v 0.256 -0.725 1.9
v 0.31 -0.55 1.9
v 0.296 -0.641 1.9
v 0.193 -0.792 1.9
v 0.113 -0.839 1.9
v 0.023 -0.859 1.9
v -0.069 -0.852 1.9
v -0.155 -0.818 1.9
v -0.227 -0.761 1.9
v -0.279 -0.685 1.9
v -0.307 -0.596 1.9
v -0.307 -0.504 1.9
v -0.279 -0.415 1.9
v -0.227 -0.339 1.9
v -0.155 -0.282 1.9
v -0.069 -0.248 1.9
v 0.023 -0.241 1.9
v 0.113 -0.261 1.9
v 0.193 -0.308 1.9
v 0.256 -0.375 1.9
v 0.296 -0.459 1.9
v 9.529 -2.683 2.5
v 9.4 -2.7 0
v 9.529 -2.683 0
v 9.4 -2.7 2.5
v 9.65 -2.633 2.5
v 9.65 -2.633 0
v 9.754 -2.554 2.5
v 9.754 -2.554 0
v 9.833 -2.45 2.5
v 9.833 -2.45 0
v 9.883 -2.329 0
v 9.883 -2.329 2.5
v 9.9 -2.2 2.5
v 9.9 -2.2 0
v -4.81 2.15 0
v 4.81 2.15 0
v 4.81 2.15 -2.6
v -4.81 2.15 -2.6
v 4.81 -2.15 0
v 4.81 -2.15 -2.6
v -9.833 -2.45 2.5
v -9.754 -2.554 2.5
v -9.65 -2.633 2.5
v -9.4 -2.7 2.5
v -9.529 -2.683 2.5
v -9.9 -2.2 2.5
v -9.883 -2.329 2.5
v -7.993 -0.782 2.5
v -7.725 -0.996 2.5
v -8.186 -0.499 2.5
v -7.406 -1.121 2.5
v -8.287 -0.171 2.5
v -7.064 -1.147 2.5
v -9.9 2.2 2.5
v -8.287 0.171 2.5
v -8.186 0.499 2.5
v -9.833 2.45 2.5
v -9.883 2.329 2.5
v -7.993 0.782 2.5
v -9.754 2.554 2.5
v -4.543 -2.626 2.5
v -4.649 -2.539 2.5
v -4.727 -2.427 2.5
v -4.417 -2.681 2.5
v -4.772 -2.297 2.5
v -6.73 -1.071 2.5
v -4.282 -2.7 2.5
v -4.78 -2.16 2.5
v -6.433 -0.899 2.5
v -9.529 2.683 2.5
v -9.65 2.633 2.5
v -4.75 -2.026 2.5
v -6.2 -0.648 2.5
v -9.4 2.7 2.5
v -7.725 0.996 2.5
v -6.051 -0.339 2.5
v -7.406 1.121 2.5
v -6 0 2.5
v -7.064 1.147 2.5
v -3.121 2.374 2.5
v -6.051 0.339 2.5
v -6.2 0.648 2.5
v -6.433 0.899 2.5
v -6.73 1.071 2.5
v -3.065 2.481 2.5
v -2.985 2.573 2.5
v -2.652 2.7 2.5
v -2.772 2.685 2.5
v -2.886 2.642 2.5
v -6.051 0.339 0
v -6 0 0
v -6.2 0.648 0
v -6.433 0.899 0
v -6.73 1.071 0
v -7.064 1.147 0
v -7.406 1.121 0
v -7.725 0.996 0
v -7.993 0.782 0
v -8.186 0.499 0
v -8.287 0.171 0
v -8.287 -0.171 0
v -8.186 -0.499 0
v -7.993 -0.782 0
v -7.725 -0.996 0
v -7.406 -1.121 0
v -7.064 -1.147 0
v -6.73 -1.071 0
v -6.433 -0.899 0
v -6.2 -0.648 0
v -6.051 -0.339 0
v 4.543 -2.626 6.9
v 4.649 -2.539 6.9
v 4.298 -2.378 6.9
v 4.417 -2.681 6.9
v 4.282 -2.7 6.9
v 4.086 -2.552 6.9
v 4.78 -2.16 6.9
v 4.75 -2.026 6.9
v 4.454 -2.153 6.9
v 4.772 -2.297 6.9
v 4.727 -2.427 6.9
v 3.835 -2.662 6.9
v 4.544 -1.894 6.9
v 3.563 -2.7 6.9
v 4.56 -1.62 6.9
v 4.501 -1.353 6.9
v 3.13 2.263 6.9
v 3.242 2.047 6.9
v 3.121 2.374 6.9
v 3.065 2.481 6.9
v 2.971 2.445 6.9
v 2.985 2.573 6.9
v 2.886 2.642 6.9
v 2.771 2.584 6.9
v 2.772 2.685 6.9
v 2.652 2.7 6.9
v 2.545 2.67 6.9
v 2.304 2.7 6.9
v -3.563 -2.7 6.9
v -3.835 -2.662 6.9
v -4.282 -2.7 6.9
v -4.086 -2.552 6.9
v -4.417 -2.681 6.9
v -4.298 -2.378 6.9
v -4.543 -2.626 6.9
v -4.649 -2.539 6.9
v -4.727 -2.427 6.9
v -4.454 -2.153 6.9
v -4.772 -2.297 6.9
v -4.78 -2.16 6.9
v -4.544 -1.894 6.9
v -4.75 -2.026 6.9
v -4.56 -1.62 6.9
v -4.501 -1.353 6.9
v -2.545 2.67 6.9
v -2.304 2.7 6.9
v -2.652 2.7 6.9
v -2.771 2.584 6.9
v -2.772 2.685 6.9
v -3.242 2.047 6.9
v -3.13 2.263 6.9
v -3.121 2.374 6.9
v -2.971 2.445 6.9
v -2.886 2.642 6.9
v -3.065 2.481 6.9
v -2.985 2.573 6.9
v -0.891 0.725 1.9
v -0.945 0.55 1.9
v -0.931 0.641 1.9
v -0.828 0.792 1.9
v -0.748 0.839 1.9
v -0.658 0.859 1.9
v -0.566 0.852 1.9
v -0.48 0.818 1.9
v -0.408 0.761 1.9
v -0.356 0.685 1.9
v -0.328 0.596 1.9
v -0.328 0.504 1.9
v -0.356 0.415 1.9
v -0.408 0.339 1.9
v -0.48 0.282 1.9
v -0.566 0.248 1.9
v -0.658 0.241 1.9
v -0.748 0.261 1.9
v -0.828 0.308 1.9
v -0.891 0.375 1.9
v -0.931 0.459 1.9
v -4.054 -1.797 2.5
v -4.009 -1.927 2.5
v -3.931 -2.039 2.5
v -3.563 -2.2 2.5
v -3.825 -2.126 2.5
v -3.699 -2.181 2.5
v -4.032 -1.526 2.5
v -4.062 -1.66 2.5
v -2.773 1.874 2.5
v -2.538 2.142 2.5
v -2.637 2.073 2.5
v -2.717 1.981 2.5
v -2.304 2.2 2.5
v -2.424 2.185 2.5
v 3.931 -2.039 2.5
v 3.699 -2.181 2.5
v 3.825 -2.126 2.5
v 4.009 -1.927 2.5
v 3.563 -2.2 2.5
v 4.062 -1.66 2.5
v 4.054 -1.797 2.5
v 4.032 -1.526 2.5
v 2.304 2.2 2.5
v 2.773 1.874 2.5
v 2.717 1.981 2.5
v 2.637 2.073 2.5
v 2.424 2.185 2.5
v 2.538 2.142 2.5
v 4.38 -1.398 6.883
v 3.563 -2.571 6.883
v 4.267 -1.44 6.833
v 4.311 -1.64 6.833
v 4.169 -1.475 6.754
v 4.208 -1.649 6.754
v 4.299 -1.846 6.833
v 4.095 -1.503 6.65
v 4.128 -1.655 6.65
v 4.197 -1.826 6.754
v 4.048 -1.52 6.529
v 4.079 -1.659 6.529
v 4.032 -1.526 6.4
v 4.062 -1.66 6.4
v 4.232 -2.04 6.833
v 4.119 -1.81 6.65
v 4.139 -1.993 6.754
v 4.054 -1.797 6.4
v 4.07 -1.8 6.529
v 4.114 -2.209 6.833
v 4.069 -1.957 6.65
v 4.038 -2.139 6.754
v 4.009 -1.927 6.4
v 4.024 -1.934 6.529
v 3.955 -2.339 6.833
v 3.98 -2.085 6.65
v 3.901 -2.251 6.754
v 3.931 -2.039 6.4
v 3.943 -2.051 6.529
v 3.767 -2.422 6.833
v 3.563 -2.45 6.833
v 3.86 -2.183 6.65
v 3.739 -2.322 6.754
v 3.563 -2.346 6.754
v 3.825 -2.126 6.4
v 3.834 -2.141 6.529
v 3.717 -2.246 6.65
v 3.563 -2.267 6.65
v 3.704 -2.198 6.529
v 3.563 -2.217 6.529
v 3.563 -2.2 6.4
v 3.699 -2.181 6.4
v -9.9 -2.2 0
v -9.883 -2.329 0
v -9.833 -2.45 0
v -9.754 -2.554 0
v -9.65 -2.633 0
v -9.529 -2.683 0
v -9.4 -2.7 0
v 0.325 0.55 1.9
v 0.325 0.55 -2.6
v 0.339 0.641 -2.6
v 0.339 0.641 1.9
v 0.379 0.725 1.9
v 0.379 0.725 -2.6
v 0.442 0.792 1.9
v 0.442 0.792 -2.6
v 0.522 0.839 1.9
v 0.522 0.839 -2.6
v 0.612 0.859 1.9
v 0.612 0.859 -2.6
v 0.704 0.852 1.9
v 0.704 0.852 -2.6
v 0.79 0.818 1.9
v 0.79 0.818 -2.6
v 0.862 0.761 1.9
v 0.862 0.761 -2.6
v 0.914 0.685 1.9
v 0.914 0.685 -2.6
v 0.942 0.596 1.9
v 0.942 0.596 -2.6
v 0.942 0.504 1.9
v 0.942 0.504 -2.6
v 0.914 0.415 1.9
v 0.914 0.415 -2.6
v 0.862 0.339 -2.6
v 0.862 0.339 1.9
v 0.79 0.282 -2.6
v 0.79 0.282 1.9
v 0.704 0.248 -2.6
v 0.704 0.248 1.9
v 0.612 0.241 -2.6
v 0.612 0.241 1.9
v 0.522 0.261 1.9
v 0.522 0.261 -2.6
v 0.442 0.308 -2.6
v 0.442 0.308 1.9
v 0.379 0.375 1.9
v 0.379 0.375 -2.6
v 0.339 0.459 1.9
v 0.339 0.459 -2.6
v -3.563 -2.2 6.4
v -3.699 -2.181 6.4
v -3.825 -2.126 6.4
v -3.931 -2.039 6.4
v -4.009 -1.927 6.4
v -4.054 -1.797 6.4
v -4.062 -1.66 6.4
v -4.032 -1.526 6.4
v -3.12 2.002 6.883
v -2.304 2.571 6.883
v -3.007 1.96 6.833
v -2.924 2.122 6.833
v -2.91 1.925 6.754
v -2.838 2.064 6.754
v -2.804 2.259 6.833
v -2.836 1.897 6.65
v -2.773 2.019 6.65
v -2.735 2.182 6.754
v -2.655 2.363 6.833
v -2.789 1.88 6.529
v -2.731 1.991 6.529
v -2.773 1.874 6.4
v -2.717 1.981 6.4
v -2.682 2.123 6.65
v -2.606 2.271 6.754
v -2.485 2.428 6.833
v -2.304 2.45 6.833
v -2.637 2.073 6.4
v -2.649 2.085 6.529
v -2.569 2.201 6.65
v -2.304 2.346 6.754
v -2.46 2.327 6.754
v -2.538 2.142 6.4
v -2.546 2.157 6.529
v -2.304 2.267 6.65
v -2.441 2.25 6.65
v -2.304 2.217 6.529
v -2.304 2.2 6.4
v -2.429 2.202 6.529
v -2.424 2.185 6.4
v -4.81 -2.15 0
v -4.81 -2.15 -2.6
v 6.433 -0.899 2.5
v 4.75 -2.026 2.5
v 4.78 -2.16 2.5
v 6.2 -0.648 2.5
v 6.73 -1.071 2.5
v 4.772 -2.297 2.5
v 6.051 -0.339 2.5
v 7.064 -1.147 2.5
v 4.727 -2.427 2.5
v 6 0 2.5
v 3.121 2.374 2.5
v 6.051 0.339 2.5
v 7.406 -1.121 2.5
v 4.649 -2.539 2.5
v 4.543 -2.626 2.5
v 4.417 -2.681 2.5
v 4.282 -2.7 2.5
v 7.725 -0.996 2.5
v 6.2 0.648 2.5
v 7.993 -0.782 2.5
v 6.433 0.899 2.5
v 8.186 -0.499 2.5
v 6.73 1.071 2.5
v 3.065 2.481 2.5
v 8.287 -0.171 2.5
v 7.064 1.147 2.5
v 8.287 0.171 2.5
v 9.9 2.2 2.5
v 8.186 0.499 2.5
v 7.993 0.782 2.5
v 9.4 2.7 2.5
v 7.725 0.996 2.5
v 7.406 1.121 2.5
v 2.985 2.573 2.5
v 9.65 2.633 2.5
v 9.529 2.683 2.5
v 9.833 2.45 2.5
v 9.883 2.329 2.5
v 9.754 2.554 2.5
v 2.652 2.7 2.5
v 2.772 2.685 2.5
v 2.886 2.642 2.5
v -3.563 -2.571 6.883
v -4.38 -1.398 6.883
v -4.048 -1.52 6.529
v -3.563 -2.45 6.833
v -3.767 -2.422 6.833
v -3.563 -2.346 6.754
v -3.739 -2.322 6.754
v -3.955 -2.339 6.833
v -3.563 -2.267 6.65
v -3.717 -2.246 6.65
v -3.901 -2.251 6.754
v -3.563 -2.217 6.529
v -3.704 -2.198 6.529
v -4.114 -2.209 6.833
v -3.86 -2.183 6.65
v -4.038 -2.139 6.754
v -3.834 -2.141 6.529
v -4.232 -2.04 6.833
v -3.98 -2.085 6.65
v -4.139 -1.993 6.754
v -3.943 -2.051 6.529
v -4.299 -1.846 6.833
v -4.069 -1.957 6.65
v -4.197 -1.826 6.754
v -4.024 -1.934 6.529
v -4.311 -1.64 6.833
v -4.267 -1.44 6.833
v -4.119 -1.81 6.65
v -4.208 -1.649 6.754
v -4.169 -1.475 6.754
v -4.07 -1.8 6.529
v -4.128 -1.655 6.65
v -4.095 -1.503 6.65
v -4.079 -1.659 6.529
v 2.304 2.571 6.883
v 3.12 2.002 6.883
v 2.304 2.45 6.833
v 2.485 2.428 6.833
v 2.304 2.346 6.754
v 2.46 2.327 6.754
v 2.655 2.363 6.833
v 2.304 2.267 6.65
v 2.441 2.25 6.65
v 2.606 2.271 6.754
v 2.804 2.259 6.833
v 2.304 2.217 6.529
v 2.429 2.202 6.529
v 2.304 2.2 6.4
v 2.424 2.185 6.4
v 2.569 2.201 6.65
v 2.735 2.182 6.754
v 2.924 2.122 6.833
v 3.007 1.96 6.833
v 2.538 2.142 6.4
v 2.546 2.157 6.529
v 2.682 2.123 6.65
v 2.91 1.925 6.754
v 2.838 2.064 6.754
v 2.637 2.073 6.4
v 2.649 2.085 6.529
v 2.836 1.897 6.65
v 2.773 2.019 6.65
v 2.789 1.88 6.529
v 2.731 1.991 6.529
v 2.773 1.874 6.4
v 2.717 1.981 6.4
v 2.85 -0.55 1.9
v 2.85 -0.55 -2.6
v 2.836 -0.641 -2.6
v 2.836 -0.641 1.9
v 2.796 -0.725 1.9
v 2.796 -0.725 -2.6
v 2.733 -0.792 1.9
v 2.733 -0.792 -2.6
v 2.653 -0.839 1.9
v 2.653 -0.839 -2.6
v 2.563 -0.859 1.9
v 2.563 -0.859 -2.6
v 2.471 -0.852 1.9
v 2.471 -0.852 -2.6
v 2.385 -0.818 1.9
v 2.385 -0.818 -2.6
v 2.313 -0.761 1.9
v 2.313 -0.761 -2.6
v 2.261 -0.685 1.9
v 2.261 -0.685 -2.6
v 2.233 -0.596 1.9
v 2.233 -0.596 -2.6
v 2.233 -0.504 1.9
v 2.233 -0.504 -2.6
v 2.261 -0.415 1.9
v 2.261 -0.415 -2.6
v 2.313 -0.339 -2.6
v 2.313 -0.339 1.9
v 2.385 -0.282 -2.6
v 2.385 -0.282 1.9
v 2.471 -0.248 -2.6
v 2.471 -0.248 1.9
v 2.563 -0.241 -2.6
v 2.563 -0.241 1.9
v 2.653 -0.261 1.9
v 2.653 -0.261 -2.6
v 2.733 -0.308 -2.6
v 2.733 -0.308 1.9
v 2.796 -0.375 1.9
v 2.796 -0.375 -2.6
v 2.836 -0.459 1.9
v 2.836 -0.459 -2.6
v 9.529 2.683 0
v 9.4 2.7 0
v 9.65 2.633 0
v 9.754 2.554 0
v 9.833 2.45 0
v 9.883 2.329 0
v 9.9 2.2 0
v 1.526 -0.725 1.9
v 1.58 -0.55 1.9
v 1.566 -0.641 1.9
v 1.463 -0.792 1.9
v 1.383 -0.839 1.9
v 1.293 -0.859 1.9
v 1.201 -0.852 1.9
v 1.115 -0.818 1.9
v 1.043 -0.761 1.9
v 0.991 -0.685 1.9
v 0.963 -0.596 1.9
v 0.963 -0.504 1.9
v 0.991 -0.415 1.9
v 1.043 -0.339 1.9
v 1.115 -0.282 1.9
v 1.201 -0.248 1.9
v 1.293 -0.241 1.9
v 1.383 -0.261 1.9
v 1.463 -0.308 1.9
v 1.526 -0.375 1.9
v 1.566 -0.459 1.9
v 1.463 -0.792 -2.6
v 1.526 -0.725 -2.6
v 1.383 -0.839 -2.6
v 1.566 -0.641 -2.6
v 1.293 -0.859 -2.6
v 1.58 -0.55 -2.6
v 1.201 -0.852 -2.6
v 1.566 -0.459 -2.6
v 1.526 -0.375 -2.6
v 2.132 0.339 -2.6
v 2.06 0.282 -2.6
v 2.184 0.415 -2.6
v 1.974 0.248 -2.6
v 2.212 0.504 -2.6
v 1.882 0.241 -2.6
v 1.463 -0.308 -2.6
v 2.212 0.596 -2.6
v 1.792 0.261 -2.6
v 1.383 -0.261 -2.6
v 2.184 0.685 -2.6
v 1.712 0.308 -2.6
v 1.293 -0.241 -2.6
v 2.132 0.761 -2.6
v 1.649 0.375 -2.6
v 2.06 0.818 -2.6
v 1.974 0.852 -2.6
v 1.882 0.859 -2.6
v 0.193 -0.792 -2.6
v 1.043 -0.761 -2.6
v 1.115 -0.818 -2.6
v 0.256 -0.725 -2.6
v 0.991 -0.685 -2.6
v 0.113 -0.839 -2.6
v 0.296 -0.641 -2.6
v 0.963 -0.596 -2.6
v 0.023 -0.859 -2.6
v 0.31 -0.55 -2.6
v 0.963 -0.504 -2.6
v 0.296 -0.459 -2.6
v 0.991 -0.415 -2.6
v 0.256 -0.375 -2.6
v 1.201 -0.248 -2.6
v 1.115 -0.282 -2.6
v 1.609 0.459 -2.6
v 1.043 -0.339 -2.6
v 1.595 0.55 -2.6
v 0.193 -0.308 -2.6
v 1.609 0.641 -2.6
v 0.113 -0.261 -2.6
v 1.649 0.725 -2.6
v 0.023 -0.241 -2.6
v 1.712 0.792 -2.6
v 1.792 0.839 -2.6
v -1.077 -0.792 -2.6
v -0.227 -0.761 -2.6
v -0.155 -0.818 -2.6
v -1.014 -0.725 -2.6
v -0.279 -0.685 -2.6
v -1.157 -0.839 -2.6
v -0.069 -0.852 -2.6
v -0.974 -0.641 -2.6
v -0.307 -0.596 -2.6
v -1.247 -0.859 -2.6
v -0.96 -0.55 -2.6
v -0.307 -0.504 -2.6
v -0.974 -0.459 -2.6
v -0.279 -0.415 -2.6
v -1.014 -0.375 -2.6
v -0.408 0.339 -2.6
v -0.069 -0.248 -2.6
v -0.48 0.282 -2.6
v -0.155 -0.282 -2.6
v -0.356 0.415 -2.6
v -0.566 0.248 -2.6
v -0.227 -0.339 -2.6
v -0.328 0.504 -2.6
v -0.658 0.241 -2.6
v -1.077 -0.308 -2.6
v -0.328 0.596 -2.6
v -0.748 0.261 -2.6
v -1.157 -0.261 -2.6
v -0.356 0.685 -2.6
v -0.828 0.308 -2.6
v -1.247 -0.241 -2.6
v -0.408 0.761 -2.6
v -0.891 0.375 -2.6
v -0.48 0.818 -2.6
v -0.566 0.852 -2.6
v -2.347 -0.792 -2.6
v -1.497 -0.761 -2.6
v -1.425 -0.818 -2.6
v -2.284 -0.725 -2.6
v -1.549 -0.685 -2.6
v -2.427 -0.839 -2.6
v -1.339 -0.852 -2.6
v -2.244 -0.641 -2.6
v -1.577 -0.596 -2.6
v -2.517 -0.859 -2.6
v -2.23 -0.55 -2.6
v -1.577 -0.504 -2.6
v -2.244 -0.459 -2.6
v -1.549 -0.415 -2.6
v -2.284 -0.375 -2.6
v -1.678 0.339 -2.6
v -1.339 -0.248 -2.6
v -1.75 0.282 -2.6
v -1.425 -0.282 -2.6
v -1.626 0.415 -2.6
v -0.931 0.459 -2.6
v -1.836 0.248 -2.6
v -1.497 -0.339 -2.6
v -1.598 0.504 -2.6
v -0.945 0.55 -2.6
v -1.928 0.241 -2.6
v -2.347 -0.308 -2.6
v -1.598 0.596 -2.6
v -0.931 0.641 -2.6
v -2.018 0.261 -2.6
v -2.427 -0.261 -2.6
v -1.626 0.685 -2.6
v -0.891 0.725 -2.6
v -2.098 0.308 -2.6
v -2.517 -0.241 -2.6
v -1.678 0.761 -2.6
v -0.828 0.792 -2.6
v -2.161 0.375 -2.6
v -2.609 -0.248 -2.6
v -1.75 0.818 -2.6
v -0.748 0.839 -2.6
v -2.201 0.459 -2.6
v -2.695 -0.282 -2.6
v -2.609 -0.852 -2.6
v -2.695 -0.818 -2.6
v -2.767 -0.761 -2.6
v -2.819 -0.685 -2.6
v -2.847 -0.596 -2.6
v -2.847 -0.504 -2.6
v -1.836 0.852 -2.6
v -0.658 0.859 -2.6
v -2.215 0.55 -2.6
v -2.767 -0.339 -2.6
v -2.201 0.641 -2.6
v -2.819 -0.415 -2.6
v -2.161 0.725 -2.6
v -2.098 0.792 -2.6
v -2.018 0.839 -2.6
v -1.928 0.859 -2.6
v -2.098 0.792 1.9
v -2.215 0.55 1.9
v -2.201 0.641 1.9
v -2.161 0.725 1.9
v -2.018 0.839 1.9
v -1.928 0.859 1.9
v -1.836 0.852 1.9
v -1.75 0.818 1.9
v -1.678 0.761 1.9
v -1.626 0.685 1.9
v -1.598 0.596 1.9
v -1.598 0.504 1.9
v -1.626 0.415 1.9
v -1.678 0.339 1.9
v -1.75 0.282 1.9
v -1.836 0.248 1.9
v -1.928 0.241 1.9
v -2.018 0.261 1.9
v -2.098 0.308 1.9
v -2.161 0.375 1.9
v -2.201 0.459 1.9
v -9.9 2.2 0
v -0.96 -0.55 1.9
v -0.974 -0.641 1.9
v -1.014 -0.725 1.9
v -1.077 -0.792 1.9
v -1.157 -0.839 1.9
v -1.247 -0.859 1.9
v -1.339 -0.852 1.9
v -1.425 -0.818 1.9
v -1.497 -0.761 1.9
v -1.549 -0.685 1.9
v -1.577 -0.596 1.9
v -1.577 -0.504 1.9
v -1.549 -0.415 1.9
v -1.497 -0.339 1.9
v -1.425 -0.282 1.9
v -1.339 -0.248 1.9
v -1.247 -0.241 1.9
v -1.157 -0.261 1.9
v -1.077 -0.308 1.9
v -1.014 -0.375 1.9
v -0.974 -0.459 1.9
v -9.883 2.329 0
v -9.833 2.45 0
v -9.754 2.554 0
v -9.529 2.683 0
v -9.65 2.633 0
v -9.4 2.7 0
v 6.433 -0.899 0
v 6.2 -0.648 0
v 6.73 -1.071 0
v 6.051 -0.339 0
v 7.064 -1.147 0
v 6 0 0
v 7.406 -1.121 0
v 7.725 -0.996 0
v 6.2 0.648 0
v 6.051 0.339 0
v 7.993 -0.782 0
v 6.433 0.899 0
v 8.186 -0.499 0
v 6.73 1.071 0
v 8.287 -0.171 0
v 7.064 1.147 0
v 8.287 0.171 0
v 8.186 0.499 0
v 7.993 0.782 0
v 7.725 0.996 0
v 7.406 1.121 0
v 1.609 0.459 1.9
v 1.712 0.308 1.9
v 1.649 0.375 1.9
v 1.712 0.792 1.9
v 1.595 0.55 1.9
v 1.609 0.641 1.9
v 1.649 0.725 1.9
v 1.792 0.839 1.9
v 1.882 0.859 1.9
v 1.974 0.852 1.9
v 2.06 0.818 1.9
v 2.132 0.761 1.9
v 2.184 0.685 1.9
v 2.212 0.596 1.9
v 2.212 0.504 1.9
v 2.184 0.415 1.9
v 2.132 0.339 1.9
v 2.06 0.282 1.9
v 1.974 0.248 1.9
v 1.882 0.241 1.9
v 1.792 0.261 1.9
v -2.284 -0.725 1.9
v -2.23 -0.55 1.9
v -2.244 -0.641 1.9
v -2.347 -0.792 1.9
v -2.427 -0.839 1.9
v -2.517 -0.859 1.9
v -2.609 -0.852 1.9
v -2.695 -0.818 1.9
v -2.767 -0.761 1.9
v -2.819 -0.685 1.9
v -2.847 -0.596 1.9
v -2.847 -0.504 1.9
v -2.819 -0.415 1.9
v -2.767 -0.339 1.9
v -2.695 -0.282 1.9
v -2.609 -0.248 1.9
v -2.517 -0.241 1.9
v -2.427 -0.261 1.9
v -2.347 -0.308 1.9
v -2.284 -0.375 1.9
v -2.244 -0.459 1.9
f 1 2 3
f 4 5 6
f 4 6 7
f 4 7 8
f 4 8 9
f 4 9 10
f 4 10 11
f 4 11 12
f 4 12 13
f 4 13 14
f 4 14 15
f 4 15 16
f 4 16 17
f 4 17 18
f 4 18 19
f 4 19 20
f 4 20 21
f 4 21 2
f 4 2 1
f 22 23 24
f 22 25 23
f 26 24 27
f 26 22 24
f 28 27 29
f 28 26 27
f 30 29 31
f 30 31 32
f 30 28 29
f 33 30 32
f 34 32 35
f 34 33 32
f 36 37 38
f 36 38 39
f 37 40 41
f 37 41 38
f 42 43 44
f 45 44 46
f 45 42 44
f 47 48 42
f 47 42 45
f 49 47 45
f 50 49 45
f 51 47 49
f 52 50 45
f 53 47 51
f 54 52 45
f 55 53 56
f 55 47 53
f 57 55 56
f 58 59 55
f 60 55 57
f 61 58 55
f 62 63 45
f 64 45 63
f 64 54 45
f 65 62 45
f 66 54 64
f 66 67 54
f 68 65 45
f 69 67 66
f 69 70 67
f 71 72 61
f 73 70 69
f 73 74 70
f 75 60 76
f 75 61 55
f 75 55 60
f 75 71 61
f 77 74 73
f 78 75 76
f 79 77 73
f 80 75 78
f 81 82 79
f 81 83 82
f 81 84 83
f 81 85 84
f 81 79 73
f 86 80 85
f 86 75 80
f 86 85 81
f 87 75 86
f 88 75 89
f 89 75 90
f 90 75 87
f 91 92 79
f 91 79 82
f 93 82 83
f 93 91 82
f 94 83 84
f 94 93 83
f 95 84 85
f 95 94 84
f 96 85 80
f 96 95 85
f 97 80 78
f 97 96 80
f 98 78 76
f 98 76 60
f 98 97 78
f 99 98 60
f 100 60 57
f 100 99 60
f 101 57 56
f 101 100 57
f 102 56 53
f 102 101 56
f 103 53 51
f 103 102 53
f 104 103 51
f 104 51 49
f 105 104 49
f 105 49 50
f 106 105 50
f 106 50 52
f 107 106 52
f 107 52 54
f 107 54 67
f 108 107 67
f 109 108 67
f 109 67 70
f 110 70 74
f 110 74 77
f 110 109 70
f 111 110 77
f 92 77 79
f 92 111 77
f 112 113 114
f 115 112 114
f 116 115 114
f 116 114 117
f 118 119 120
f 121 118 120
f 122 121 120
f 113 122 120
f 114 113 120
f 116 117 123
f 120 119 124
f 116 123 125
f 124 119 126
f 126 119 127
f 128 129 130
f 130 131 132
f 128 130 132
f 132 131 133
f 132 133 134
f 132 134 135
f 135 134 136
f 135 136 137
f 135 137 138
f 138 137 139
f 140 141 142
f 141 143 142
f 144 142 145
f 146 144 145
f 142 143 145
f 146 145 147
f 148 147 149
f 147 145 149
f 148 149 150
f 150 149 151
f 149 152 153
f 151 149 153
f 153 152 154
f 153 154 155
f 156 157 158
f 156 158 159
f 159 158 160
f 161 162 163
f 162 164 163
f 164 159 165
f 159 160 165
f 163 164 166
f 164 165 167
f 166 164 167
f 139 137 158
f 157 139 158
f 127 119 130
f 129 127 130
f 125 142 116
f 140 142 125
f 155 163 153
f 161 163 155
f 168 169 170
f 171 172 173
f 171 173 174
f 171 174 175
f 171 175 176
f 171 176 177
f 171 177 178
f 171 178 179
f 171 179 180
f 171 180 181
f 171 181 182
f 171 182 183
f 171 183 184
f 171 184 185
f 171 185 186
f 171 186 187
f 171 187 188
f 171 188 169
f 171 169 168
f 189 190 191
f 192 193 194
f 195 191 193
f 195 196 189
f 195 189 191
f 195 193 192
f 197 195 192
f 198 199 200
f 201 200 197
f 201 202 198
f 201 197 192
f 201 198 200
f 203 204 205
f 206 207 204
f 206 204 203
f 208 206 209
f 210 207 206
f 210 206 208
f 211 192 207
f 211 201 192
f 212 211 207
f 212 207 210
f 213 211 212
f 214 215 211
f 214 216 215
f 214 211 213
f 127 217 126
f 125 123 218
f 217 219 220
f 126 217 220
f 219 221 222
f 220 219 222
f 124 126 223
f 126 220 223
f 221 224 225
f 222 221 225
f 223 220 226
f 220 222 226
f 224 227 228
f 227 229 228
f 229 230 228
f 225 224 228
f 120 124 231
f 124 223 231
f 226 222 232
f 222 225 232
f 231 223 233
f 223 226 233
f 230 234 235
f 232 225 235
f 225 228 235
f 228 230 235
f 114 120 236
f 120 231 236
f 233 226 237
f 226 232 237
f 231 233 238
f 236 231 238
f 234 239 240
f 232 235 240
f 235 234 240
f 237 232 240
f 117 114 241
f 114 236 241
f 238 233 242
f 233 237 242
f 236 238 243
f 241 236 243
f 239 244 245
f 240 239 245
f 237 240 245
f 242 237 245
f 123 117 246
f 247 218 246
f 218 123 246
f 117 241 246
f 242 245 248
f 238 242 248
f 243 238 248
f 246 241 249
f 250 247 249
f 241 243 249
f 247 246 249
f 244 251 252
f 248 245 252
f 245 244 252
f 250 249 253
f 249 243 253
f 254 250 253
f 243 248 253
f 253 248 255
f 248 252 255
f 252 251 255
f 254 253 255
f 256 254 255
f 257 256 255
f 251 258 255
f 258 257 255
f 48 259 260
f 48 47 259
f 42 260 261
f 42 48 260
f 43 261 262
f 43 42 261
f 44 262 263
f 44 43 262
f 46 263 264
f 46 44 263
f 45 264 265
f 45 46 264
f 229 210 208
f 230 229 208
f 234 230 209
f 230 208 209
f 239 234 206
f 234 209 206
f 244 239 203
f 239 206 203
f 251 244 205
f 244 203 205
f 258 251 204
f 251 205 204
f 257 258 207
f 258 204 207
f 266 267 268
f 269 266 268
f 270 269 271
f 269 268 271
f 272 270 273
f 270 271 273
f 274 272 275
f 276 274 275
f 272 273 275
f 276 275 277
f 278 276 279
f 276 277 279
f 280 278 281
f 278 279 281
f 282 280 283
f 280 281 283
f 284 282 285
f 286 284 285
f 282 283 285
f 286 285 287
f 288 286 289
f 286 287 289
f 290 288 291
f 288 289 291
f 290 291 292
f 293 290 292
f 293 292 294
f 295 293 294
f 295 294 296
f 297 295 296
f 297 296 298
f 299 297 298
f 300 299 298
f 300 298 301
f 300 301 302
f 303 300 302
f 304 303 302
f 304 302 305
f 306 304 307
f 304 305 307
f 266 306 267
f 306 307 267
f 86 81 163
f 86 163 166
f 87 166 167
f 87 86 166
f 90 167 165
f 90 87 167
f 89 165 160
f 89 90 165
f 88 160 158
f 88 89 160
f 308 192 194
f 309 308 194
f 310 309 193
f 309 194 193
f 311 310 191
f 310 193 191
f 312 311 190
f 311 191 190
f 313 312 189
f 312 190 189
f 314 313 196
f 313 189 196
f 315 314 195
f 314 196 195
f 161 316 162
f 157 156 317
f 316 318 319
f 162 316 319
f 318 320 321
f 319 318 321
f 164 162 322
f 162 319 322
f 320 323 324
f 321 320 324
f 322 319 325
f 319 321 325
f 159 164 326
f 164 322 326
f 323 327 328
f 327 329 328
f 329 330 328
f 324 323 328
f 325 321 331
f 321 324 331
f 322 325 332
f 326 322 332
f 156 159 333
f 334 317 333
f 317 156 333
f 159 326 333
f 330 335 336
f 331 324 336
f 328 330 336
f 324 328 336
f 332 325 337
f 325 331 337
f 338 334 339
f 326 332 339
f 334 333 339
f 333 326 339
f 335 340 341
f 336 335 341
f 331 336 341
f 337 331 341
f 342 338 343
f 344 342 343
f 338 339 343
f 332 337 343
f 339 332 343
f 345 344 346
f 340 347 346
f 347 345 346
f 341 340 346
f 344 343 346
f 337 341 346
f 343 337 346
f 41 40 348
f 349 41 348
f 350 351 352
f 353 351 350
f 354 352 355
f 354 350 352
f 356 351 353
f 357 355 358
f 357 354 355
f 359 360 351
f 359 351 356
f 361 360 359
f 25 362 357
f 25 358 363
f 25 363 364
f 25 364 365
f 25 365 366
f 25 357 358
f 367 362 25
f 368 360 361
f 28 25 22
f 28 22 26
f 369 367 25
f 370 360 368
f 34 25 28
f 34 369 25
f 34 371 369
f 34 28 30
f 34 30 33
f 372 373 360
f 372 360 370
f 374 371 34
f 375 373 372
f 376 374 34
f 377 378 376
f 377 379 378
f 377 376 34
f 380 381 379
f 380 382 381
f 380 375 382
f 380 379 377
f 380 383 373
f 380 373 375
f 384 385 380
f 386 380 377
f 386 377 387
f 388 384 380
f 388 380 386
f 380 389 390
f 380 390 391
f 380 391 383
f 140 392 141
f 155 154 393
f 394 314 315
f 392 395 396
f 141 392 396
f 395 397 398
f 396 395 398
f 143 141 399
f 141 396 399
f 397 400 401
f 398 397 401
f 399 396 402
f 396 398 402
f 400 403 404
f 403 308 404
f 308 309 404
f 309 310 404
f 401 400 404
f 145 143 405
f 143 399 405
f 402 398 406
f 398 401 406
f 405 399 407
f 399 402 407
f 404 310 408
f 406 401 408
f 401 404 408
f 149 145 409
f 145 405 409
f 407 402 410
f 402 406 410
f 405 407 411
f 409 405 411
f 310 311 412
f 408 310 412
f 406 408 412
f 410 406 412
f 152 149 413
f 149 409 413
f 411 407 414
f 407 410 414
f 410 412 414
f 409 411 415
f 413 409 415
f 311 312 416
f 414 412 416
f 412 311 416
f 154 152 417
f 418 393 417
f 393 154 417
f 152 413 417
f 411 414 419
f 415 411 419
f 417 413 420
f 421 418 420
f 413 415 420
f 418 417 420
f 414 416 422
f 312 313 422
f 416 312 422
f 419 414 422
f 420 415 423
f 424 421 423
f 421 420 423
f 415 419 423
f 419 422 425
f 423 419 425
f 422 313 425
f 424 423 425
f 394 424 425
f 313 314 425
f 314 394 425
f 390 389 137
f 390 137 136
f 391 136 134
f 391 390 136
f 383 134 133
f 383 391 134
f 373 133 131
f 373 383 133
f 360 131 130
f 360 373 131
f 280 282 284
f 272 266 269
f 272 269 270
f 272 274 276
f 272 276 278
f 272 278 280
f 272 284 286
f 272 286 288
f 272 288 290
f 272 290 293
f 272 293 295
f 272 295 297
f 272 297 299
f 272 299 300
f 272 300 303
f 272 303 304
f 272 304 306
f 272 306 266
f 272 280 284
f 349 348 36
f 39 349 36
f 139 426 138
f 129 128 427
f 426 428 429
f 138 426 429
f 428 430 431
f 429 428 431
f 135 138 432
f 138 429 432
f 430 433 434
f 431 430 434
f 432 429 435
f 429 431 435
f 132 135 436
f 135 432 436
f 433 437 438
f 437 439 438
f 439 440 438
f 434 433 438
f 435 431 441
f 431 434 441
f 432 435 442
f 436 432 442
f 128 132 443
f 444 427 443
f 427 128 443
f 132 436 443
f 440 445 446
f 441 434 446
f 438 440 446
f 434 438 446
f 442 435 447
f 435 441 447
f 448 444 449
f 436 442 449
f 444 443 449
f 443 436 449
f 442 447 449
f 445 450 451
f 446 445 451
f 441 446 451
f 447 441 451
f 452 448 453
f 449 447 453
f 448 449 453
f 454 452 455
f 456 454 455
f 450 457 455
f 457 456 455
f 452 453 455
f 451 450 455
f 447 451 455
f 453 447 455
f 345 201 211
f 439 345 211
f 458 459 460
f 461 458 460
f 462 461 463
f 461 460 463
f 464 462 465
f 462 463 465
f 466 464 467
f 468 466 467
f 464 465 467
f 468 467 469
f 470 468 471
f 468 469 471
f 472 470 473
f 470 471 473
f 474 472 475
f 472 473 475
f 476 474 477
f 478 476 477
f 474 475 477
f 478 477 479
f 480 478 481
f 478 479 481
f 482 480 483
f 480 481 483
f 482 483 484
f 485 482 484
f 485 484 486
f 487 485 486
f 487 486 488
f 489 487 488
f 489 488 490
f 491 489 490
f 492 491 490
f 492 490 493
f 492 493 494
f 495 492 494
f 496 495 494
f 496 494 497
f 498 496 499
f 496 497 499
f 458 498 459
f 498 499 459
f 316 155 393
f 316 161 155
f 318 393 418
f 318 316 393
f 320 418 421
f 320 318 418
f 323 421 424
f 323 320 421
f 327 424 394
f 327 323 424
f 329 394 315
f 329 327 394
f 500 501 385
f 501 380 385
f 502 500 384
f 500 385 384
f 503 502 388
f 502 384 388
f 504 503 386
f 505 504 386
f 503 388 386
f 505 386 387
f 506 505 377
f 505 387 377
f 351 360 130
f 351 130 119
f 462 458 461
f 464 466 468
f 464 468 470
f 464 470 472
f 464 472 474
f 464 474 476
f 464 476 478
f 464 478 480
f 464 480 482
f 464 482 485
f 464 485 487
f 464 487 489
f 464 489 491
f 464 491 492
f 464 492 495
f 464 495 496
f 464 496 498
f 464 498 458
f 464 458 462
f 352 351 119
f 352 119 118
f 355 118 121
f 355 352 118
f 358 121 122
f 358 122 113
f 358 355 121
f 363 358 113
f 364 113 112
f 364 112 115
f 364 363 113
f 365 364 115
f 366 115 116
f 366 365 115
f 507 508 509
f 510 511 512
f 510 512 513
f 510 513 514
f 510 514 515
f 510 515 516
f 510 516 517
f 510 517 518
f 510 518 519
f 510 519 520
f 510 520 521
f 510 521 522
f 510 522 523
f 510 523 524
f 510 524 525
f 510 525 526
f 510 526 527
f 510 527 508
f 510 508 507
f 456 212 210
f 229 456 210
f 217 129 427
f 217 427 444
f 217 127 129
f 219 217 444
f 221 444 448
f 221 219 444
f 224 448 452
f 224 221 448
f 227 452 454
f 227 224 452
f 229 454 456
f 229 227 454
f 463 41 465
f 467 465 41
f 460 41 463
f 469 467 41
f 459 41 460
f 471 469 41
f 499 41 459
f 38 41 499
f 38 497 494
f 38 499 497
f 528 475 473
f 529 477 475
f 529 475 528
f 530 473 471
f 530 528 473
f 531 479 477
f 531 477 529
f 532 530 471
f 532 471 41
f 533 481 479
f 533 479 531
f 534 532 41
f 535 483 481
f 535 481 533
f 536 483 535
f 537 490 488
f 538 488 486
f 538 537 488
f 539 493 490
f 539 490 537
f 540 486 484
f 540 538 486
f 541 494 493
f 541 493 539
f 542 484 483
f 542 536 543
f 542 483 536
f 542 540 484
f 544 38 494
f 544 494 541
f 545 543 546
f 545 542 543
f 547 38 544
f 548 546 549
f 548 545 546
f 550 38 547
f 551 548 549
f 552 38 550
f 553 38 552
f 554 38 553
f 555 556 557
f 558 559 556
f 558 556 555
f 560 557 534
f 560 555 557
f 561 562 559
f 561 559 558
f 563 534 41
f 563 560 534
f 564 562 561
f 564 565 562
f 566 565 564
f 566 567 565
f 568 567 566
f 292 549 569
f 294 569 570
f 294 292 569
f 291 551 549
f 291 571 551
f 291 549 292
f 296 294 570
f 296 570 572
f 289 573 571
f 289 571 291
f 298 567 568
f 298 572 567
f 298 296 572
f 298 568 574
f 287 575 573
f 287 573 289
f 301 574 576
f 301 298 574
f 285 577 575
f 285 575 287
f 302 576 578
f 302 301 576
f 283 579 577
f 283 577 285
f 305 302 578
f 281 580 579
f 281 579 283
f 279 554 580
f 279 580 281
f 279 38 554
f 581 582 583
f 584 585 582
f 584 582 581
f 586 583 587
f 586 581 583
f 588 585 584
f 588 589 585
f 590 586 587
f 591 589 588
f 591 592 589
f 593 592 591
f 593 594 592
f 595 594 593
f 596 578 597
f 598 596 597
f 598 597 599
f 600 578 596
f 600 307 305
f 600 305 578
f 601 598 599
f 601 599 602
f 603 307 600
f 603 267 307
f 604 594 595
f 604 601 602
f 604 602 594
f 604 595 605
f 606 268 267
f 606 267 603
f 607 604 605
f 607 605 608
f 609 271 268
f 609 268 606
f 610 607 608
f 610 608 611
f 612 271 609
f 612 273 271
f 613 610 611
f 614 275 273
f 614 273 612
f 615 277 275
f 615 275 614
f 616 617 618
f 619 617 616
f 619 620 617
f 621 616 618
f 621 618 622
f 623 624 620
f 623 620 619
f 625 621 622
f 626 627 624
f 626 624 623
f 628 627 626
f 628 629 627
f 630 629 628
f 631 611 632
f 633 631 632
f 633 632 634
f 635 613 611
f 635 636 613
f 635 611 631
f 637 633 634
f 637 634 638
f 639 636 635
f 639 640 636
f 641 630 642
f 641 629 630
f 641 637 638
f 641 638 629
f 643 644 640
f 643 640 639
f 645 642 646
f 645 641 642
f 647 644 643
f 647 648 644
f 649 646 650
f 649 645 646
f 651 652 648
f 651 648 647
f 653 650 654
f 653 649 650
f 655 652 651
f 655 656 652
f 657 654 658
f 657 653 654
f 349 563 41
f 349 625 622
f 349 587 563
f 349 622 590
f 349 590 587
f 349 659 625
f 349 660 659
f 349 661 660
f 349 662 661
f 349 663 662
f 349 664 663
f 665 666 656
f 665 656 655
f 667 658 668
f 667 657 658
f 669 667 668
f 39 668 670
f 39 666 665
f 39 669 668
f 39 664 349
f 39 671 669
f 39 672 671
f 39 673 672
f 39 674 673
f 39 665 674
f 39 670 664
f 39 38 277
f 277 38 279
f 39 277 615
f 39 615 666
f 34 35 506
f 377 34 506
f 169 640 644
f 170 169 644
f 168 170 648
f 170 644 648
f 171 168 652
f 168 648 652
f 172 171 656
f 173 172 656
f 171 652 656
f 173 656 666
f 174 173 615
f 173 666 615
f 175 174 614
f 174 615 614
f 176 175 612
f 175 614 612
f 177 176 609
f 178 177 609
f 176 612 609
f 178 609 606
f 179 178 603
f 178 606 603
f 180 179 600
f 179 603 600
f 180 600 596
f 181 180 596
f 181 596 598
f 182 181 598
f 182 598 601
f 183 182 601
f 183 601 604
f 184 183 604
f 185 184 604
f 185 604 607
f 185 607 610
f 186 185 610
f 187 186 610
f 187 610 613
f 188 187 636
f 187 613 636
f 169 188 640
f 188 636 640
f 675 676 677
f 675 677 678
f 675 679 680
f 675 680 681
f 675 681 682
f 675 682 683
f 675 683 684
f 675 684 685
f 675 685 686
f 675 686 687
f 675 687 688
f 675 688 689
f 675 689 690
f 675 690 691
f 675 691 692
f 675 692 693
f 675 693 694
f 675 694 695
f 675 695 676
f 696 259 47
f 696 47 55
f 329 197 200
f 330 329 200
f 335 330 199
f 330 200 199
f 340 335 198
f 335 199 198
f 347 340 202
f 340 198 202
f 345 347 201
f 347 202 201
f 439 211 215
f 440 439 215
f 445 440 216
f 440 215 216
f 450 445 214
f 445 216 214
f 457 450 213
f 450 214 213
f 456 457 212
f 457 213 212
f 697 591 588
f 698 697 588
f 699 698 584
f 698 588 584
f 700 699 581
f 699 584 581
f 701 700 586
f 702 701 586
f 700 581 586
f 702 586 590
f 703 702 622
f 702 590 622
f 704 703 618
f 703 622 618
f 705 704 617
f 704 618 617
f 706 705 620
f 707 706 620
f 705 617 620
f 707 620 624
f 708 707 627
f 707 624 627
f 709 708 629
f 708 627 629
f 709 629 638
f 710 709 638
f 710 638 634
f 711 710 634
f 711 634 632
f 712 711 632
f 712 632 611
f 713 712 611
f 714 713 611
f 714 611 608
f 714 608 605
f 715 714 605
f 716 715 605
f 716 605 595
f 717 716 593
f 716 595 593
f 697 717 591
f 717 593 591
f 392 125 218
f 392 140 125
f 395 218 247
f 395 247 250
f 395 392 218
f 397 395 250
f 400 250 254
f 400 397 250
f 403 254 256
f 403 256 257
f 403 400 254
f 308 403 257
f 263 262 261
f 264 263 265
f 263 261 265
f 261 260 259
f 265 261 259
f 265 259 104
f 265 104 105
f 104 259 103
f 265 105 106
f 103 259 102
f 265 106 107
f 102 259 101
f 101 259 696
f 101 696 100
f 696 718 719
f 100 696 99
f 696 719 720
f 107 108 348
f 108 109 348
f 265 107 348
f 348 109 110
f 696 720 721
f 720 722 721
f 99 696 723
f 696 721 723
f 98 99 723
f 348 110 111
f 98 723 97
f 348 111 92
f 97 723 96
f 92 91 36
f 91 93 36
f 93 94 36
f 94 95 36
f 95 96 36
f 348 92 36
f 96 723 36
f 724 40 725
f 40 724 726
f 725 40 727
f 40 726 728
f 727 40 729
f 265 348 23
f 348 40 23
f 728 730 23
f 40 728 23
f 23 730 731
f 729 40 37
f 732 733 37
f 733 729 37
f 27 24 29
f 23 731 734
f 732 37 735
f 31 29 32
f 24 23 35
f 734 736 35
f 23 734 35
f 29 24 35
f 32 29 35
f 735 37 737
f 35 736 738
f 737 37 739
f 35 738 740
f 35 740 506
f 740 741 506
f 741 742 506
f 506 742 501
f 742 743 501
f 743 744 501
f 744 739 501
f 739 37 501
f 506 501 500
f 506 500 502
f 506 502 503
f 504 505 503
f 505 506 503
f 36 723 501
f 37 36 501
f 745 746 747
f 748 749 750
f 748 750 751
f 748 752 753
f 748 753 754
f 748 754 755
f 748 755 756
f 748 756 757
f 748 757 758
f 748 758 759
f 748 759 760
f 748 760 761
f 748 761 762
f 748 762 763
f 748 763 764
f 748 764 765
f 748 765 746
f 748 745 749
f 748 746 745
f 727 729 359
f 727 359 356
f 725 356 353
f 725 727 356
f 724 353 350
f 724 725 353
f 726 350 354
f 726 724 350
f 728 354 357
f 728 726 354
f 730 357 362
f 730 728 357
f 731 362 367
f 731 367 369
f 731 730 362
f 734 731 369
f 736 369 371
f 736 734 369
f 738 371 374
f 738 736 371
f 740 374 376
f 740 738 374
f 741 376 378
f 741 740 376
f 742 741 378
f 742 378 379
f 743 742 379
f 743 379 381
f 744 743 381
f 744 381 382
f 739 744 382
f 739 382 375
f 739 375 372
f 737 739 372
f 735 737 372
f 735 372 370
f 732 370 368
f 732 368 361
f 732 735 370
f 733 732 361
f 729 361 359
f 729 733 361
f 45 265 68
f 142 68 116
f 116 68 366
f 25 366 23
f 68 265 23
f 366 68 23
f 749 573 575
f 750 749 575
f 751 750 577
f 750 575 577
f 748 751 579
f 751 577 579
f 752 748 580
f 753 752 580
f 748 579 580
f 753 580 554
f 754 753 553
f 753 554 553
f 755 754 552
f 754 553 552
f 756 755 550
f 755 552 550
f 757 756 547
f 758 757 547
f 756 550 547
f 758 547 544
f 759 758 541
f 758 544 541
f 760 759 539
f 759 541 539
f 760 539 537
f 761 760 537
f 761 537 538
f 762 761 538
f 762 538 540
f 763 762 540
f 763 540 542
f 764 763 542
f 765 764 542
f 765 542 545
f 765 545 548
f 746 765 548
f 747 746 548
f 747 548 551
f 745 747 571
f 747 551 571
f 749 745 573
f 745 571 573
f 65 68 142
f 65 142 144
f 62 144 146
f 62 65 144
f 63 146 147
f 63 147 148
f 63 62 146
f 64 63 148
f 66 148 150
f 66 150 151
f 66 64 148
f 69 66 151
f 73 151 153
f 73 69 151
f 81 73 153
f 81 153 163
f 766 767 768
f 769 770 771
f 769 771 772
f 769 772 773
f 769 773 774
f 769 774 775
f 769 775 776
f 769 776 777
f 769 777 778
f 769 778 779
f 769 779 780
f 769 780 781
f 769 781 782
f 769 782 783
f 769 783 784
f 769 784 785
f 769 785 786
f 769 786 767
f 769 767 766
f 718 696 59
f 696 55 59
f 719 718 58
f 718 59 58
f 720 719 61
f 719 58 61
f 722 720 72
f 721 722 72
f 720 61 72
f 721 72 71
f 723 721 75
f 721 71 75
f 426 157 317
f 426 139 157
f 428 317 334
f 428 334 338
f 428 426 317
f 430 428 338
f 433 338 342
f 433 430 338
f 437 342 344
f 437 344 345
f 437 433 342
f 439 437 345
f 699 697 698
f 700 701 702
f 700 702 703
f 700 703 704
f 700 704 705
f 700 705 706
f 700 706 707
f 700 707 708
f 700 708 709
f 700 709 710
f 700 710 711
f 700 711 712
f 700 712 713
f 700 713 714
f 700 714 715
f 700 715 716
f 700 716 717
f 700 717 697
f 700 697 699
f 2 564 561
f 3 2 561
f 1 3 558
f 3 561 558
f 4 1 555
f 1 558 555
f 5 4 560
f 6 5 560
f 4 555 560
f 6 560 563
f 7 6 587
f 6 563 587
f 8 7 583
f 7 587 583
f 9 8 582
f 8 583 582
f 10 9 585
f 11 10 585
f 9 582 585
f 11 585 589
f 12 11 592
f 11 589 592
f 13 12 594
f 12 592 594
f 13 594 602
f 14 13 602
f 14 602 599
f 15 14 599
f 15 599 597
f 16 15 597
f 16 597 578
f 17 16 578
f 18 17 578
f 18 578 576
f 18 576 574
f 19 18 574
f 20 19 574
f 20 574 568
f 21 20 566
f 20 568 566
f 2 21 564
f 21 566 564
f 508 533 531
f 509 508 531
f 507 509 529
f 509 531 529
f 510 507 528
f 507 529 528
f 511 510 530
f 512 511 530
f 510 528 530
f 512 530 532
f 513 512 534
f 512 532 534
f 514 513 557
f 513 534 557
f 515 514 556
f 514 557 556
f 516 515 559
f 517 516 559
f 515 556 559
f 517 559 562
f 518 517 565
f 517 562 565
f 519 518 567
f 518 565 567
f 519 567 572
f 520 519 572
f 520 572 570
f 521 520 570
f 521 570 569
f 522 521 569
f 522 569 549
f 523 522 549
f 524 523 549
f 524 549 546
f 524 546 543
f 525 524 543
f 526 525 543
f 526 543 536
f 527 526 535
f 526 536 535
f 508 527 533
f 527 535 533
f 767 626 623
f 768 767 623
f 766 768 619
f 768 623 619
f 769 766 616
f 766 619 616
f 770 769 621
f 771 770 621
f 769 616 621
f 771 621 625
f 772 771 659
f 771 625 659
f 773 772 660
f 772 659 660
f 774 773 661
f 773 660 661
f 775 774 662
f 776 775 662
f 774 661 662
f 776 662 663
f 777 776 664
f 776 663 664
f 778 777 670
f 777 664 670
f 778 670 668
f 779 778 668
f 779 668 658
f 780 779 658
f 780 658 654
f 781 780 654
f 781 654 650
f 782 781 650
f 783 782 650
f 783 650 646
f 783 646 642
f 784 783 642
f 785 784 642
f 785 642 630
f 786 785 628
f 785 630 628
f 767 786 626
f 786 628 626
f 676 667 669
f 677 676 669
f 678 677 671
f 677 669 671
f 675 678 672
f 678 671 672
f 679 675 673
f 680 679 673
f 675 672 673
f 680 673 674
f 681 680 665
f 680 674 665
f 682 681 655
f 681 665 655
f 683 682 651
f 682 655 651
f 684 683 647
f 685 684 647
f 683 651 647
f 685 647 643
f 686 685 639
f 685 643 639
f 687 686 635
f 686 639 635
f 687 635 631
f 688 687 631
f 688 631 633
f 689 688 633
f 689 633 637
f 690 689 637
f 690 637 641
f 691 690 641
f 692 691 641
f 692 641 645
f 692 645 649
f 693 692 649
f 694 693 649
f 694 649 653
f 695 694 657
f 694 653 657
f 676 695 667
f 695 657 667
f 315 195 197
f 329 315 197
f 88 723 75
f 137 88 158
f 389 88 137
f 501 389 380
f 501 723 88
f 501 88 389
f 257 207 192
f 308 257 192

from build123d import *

# Parameters (mm, degrees)
SKETCH_1_W          = 19.8
SKETCH_1_H          = 5.4
SKETCH_1_R          = 1.15
EXTRUDE_1_DEPTH     = 2.5
FILLET_1_R          = 0.5
FILLET_2_R          = 0.5
SKETCH_3_W          = 9.62
SKETCH_3_H          = 4.3
EXTRUDE_2_DEPTH     = 2.6
SKETCH_4_R          = 0.31
CUT_EXTRUDE_1_DEPTH = 4.5
EXTRUDE_3_DEPTH     = 4.4
FILLET_3_R          = 0.5


with BuildPart() as part:
    # 草图1 → 凸台-拉伸1 (new body)
    with BuildSketch(Plane.XY):
        Rectangle(SKETCH_1_W, SKETCH_1_H)
        with Locations((-7.15, 0)):
            Circle(SKETCH_1_R, mode=Mode.SUBTRACT)
        with Locations(Location((7.15, 0, 0), (0, 0, 180))):
            Circle(SKETCH_1_R, mode=Mode.SUBTRACT)
    extrude(amount=EXTRUDE_1_DEPTH)

    # 圆角1
    fillet_1_edges = [part.edges().sort_by_distance(p)[0] for p in [
        (-9.9, 2.7, 1.25),
    ]]
    fillet(fillet_1_edges, radius=FILLET_1_R)

    # 圆角2
    fillet_2_edges = [part.edges().sort_by_distance(p)[0] for p in [
        (9.9, 2.7, 1.25),
        (9.9, -2.7, 1.25),
        (-9.9, -2.7, 1.25),
    ]]
    fillet(fillet_2_edges, radius=FILLET_2_R)

    # 草图3 → 凸台-拉伸2 (add)
    with BuildSketch(Plane(origin=(0, 0, 0), x_dir=(-1, 0, 0), z_dir=(0, 0, -1))):
        Rectangle(SKETCH_3_W, SKETCH_3_H)
    extrude(amount=EXTRUDE_2_DEPTH)

    # 草图4 → 切除-拉伸1 (cut)
    with BuildSketch(Plane(origin=(0, 0, -2.6), x_dir=(-1, 0, 0), z_dir=(0, 0, -1))):
        with Locations((-1.905, 0.55)):
            Circle(SKETCH_4_R)
        with Locations((-0.635, 0.55)):
            Circle(SKETCH_4_R)
        with Locations((0.635, 0.55)):
            Circle(SKETCH_4_R)
        with Locations((1.905, 0.55)):
            Circle(SKETCH_4_R)
        with Locations(Location((-2.54, -0.55, 0), (0, 0, 180))):
            Circle(SKETCH_4_R)
        with Locations(Location((-1.27, -0.55, 0), (0, 0, 180))):
            Circle(SKETCH_4_R)
        with Locations(Location((0, -0.55, 0), (0, 0, 180))):
            Circle(SKETCH_4_R)
        with Locations(Location((1.27, -0.55, 0), (0, 0, 180))):
            Circle(SKETCH_4_R)
        with Locations(Location((2.54, -0.55, 0), (0, 0, 180))):
            Circle(SKETCH_4_R)
    extrude(amount=-CUT_EXTRUDE_1_DEPTH, mode=Mode.SUBTRACT)

    # 草图5 → 凸台-拉伸3 (add)
    with BuildSketch(Plane.XY.offset(2.5)):
        with BuildLine():
            Line((-2.651993332, 2.7), (2.651993332, 2.7))
            ThreePointArc((2.651993332, 2.7), (2.937625447, 2.610383107), (3.120867712, 2.373657178))
            Line((3.120867712, 2.373657178), (4.750497342, -2.026342822))
            ThreePointArc((4.750497342, -2.026342822), (4.692006068, -2.485632116), (4.281622961, -2.7))
            Line((4.281622961, -2.7), (-4.281622961, -2.7))
            ThreePointArc((-4.281622961, -2.7), (-4.692006068, -2.485632116), (-4.750497342, -2.026342822))
            Line((-4.750497342, -2.026342822), (-3.120867712, 2.373657178))
            ThreePointArc((-3.120867712, 2.373657178), (-2.937625447, 2.610383107), (-2.651993332, 2.7))
        make_face()
        with BuildLine():
            Line((-2.303986663, 2.2), (2.303986663, 2.2))
            ThreePointArc((2.303986663, 2.2), (2.589618779, 2.110383107), (2.772861043, 1.873657178))
            Line((2.772861043, 1.873657178), (4.032120303, -1.526342822))
            ThreePointArc((4.032120303, -1.526342822), (3.973629029, -1.985632116), (3.563245922, -2.2))
            Line((3.563245922, -2.2), (-3.563245922, -2.2))
            ThreePointArc((-3.563245922, -2.2), (-3.973629029, -1.985632116), (-4.032120303, -1.526342822))
            Line((-4.032120303, -1.526342822), (-2.772861043, 1.873657178))
            ThreePointArc((-2.772861043, 1.873657178), (-2.589618779, 2.110383107), (-2.303986663, 2.2))
        make_face(mode=Mode.SUBTRACT)
    extrude(amount=EXTRUDE_3_DEPTH)

    # 圆角3
    fillet_3_edges = [part.edges().sort_by_distance(p)[0] for p in [
        (-3.973629029, -1.985632116, 6.9),
        (0, -2.2, 6.9),
        (3.973629029, -1.985632116, 6.9),
        (3.402490673, 0.173657178, 6.9),
        (2.589618779, 2.110383107, 6.9),
        (0, 2.2, 6.9),
        (-2.589618779, 2.110383107, 6.9),
        (-3.402490673, 0.173657178, 6.9),
    ]]
    fillet(fillet_3_edges, radius=FILLET_3_R - 0.0001)  # a hair under: the kernel refuses the full size


solid = part.part
